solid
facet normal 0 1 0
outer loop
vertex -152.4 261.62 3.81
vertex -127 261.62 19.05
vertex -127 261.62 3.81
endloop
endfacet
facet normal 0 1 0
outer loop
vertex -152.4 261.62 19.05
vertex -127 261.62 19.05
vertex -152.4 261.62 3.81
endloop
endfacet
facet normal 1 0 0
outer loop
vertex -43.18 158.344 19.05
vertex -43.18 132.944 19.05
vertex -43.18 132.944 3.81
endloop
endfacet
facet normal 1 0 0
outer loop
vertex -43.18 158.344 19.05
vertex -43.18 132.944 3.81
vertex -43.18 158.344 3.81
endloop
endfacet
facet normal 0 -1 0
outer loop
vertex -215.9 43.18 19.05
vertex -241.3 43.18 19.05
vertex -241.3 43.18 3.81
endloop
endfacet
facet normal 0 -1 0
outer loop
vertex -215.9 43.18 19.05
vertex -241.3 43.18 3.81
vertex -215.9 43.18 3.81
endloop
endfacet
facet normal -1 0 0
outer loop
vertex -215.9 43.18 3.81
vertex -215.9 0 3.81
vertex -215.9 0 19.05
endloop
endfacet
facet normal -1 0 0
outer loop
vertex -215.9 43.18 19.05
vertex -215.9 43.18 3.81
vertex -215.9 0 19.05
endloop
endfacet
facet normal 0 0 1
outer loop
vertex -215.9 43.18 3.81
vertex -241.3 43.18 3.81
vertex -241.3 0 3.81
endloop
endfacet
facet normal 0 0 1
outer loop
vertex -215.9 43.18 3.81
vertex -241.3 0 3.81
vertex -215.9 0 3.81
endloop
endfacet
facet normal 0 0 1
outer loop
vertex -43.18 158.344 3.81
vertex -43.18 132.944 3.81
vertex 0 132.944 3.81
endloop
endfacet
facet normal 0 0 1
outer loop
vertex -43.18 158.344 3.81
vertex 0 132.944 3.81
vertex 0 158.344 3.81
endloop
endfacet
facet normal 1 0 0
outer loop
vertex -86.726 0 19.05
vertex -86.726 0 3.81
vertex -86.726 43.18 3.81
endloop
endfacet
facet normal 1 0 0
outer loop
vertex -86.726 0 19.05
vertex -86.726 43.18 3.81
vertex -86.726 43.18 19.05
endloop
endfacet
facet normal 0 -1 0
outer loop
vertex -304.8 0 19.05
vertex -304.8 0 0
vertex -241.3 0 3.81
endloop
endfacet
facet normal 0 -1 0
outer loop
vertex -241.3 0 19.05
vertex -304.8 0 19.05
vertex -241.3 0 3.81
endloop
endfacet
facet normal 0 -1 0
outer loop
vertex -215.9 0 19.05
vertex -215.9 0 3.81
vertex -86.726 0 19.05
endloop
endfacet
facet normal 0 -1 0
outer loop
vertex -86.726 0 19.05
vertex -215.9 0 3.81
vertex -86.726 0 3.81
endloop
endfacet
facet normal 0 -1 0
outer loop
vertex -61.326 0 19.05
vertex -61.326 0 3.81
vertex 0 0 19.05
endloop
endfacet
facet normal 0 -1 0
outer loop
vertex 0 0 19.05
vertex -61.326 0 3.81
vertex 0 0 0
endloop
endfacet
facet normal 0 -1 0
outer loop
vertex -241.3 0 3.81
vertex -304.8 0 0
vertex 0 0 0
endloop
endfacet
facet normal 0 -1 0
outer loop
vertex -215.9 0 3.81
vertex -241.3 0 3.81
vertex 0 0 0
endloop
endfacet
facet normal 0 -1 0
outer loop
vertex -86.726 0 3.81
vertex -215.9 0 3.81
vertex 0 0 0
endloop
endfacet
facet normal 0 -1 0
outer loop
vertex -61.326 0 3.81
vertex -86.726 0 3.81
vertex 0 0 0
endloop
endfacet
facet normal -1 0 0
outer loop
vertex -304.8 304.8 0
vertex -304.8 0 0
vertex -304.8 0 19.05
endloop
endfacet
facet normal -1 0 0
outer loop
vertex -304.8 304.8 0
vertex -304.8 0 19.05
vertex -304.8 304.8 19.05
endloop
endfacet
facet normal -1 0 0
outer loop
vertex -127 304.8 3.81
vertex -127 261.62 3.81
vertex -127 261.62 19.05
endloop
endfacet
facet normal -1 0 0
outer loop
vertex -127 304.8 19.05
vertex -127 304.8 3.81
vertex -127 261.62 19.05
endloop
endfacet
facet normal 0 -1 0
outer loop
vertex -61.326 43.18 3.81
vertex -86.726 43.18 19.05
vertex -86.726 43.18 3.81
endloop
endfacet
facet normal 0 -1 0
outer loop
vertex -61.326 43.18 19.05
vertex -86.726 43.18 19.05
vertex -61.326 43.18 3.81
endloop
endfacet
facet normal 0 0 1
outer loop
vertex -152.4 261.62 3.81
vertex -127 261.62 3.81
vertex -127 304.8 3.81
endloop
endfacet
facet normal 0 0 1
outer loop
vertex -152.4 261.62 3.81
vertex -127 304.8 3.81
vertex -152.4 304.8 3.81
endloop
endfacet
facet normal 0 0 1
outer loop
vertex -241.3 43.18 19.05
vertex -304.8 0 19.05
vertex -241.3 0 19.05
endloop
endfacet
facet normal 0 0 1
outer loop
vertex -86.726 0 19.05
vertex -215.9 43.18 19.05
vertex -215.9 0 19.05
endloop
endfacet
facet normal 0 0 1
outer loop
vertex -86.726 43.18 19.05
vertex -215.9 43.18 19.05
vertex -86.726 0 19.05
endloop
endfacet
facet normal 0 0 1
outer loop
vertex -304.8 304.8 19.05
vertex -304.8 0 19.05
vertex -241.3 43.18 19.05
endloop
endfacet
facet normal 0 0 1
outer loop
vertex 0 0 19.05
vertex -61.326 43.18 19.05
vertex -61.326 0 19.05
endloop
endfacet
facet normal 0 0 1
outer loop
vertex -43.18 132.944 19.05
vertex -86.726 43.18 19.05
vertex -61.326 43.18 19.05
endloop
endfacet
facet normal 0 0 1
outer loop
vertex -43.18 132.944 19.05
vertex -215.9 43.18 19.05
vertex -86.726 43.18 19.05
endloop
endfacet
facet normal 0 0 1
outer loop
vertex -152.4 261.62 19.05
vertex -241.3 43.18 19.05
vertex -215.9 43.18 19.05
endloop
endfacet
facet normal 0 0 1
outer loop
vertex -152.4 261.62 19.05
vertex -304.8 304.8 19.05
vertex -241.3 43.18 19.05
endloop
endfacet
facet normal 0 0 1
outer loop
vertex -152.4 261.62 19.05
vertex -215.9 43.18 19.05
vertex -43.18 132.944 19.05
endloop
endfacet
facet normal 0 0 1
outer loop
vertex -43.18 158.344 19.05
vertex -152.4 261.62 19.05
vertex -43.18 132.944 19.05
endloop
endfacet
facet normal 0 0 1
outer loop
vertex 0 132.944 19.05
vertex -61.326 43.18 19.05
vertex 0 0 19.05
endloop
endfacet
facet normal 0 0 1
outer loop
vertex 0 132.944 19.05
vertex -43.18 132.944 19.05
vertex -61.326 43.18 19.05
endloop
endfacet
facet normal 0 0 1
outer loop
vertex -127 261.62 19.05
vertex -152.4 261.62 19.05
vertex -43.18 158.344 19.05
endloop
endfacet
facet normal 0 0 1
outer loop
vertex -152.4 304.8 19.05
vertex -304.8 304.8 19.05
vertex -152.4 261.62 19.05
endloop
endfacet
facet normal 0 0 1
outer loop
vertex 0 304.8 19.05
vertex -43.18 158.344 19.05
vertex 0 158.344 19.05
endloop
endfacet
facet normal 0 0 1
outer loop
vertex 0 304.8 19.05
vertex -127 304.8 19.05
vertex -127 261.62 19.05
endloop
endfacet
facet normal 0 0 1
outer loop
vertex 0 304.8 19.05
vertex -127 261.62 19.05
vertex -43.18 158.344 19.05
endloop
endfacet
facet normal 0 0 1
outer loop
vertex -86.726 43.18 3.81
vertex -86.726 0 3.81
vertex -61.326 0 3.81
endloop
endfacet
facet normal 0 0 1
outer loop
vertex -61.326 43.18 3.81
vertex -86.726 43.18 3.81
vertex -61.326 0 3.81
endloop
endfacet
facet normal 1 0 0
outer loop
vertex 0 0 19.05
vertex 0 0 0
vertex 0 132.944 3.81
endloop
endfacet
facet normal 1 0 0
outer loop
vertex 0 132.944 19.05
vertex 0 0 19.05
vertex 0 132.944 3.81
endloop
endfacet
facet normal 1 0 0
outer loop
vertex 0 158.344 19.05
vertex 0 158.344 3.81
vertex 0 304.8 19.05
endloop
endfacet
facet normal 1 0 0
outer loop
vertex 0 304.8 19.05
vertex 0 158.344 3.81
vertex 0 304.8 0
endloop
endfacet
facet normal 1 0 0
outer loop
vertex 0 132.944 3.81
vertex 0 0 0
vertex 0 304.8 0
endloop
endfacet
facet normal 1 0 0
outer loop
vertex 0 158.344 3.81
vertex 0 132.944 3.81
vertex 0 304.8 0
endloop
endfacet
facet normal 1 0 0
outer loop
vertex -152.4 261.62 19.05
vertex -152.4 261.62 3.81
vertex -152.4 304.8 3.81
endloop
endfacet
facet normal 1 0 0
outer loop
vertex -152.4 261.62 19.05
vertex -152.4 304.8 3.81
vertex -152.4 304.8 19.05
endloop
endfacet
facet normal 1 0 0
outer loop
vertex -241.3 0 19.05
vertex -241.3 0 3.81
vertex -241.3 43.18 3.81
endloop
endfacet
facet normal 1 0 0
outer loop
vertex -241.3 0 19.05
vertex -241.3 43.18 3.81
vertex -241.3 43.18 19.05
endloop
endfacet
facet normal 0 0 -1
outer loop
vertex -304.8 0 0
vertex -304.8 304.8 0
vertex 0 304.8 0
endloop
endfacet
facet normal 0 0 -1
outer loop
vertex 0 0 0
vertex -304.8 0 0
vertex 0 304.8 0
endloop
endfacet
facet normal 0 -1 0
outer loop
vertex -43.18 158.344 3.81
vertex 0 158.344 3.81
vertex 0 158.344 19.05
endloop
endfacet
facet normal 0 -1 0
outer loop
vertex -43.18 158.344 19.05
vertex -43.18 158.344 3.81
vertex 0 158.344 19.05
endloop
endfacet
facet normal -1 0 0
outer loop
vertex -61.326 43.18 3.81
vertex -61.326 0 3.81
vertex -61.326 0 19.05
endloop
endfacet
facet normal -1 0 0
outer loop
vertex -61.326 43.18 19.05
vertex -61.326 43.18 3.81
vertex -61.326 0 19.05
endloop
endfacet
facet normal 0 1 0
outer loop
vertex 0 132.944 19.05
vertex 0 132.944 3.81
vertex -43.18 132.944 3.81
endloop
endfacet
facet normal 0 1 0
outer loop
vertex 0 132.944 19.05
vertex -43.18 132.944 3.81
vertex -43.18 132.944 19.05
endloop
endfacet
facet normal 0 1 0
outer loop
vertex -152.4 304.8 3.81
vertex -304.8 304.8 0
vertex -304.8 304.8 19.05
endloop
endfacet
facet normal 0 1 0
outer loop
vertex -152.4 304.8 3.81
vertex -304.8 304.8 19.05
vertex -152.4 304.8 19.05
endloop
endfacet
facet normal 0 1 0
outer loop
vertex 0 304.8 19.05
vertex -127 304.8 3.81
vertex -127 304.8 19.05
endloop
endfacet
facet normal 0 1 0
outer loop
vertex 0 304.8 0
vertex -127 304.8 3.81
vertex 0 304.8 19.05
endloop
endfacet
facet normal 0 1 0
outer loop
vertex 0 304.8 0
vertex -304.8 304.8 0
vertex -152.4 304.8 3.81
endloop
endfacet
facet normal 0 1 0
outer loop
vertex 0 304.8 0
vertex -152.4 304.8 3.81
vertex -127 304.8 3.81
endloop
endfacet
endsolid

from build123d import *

# Parameters (mm, degrees)
F0_W     = 304.8
F0_H     = 304.8
F1_DEPTH = 19.05
F2_W     = 25.4
F2_H     = 15.24
F3_DEPTH = 43.18
F4_W     = 25.4
F4_H     = 15.24
F5_DEPTH = 43.18
F6_W     = 25.4
F6_H     = 15.24
F7_DEPTH = 43.18
F8_W     = 25.4
F8_H     = 15.24
F9_DEPTH = 43.18


with BuildPart() as f1:
    # F0 (on Top) → F1 (new body)
    with BuildSketch(Plane.XY):
        with Locations((-152.4, 152.4)):
            Rectangle(F0_W, F0_H)
    extrude(amount=F1_DEPTH)

    # F2 (on face) → F3 (cut)
    with BuildSketch(Plane.XZ):
        with Locations((-228.6, 11.43)):
            Rectangle(F2_W, F2_H)
    extrude(amount=-F3_DEPTH, mode=Mode.SUBTRACT)

    # F4 (on face) → F5 (cut)
    with BuildSketch(Plane.XZ):
        with Locations((-74.026464, 11.43)):
            Rectangle(F4_W, F4_H)
    extrude(amount=-F5_DEPTH, mode=Mode.SUBTRACT)

    # F6 (on face) → F7 (cut)
    with BuildSketch(Plane(origin=(0, 304.8, 0), x_dir=(-1, 0, 0), z_dir=(0, 1, 0))):
        with Locations((139.7, 11.43)):
            Rectangle(F6_W, F6_H)
    extrude(amount=-F7_DEPTH, mode=Mode.SUBTRACT)

    # F8 (on face) → F9 (cut)
    with BuildSketch(Plane.YZ):
        with Locations((145.6436, 11.43)):
            Rectangle(F8_W, F8_H)
    extrude(amount=-F9_DEPTH, mode=Mode.SUBTRACT)


solid = f1.part
